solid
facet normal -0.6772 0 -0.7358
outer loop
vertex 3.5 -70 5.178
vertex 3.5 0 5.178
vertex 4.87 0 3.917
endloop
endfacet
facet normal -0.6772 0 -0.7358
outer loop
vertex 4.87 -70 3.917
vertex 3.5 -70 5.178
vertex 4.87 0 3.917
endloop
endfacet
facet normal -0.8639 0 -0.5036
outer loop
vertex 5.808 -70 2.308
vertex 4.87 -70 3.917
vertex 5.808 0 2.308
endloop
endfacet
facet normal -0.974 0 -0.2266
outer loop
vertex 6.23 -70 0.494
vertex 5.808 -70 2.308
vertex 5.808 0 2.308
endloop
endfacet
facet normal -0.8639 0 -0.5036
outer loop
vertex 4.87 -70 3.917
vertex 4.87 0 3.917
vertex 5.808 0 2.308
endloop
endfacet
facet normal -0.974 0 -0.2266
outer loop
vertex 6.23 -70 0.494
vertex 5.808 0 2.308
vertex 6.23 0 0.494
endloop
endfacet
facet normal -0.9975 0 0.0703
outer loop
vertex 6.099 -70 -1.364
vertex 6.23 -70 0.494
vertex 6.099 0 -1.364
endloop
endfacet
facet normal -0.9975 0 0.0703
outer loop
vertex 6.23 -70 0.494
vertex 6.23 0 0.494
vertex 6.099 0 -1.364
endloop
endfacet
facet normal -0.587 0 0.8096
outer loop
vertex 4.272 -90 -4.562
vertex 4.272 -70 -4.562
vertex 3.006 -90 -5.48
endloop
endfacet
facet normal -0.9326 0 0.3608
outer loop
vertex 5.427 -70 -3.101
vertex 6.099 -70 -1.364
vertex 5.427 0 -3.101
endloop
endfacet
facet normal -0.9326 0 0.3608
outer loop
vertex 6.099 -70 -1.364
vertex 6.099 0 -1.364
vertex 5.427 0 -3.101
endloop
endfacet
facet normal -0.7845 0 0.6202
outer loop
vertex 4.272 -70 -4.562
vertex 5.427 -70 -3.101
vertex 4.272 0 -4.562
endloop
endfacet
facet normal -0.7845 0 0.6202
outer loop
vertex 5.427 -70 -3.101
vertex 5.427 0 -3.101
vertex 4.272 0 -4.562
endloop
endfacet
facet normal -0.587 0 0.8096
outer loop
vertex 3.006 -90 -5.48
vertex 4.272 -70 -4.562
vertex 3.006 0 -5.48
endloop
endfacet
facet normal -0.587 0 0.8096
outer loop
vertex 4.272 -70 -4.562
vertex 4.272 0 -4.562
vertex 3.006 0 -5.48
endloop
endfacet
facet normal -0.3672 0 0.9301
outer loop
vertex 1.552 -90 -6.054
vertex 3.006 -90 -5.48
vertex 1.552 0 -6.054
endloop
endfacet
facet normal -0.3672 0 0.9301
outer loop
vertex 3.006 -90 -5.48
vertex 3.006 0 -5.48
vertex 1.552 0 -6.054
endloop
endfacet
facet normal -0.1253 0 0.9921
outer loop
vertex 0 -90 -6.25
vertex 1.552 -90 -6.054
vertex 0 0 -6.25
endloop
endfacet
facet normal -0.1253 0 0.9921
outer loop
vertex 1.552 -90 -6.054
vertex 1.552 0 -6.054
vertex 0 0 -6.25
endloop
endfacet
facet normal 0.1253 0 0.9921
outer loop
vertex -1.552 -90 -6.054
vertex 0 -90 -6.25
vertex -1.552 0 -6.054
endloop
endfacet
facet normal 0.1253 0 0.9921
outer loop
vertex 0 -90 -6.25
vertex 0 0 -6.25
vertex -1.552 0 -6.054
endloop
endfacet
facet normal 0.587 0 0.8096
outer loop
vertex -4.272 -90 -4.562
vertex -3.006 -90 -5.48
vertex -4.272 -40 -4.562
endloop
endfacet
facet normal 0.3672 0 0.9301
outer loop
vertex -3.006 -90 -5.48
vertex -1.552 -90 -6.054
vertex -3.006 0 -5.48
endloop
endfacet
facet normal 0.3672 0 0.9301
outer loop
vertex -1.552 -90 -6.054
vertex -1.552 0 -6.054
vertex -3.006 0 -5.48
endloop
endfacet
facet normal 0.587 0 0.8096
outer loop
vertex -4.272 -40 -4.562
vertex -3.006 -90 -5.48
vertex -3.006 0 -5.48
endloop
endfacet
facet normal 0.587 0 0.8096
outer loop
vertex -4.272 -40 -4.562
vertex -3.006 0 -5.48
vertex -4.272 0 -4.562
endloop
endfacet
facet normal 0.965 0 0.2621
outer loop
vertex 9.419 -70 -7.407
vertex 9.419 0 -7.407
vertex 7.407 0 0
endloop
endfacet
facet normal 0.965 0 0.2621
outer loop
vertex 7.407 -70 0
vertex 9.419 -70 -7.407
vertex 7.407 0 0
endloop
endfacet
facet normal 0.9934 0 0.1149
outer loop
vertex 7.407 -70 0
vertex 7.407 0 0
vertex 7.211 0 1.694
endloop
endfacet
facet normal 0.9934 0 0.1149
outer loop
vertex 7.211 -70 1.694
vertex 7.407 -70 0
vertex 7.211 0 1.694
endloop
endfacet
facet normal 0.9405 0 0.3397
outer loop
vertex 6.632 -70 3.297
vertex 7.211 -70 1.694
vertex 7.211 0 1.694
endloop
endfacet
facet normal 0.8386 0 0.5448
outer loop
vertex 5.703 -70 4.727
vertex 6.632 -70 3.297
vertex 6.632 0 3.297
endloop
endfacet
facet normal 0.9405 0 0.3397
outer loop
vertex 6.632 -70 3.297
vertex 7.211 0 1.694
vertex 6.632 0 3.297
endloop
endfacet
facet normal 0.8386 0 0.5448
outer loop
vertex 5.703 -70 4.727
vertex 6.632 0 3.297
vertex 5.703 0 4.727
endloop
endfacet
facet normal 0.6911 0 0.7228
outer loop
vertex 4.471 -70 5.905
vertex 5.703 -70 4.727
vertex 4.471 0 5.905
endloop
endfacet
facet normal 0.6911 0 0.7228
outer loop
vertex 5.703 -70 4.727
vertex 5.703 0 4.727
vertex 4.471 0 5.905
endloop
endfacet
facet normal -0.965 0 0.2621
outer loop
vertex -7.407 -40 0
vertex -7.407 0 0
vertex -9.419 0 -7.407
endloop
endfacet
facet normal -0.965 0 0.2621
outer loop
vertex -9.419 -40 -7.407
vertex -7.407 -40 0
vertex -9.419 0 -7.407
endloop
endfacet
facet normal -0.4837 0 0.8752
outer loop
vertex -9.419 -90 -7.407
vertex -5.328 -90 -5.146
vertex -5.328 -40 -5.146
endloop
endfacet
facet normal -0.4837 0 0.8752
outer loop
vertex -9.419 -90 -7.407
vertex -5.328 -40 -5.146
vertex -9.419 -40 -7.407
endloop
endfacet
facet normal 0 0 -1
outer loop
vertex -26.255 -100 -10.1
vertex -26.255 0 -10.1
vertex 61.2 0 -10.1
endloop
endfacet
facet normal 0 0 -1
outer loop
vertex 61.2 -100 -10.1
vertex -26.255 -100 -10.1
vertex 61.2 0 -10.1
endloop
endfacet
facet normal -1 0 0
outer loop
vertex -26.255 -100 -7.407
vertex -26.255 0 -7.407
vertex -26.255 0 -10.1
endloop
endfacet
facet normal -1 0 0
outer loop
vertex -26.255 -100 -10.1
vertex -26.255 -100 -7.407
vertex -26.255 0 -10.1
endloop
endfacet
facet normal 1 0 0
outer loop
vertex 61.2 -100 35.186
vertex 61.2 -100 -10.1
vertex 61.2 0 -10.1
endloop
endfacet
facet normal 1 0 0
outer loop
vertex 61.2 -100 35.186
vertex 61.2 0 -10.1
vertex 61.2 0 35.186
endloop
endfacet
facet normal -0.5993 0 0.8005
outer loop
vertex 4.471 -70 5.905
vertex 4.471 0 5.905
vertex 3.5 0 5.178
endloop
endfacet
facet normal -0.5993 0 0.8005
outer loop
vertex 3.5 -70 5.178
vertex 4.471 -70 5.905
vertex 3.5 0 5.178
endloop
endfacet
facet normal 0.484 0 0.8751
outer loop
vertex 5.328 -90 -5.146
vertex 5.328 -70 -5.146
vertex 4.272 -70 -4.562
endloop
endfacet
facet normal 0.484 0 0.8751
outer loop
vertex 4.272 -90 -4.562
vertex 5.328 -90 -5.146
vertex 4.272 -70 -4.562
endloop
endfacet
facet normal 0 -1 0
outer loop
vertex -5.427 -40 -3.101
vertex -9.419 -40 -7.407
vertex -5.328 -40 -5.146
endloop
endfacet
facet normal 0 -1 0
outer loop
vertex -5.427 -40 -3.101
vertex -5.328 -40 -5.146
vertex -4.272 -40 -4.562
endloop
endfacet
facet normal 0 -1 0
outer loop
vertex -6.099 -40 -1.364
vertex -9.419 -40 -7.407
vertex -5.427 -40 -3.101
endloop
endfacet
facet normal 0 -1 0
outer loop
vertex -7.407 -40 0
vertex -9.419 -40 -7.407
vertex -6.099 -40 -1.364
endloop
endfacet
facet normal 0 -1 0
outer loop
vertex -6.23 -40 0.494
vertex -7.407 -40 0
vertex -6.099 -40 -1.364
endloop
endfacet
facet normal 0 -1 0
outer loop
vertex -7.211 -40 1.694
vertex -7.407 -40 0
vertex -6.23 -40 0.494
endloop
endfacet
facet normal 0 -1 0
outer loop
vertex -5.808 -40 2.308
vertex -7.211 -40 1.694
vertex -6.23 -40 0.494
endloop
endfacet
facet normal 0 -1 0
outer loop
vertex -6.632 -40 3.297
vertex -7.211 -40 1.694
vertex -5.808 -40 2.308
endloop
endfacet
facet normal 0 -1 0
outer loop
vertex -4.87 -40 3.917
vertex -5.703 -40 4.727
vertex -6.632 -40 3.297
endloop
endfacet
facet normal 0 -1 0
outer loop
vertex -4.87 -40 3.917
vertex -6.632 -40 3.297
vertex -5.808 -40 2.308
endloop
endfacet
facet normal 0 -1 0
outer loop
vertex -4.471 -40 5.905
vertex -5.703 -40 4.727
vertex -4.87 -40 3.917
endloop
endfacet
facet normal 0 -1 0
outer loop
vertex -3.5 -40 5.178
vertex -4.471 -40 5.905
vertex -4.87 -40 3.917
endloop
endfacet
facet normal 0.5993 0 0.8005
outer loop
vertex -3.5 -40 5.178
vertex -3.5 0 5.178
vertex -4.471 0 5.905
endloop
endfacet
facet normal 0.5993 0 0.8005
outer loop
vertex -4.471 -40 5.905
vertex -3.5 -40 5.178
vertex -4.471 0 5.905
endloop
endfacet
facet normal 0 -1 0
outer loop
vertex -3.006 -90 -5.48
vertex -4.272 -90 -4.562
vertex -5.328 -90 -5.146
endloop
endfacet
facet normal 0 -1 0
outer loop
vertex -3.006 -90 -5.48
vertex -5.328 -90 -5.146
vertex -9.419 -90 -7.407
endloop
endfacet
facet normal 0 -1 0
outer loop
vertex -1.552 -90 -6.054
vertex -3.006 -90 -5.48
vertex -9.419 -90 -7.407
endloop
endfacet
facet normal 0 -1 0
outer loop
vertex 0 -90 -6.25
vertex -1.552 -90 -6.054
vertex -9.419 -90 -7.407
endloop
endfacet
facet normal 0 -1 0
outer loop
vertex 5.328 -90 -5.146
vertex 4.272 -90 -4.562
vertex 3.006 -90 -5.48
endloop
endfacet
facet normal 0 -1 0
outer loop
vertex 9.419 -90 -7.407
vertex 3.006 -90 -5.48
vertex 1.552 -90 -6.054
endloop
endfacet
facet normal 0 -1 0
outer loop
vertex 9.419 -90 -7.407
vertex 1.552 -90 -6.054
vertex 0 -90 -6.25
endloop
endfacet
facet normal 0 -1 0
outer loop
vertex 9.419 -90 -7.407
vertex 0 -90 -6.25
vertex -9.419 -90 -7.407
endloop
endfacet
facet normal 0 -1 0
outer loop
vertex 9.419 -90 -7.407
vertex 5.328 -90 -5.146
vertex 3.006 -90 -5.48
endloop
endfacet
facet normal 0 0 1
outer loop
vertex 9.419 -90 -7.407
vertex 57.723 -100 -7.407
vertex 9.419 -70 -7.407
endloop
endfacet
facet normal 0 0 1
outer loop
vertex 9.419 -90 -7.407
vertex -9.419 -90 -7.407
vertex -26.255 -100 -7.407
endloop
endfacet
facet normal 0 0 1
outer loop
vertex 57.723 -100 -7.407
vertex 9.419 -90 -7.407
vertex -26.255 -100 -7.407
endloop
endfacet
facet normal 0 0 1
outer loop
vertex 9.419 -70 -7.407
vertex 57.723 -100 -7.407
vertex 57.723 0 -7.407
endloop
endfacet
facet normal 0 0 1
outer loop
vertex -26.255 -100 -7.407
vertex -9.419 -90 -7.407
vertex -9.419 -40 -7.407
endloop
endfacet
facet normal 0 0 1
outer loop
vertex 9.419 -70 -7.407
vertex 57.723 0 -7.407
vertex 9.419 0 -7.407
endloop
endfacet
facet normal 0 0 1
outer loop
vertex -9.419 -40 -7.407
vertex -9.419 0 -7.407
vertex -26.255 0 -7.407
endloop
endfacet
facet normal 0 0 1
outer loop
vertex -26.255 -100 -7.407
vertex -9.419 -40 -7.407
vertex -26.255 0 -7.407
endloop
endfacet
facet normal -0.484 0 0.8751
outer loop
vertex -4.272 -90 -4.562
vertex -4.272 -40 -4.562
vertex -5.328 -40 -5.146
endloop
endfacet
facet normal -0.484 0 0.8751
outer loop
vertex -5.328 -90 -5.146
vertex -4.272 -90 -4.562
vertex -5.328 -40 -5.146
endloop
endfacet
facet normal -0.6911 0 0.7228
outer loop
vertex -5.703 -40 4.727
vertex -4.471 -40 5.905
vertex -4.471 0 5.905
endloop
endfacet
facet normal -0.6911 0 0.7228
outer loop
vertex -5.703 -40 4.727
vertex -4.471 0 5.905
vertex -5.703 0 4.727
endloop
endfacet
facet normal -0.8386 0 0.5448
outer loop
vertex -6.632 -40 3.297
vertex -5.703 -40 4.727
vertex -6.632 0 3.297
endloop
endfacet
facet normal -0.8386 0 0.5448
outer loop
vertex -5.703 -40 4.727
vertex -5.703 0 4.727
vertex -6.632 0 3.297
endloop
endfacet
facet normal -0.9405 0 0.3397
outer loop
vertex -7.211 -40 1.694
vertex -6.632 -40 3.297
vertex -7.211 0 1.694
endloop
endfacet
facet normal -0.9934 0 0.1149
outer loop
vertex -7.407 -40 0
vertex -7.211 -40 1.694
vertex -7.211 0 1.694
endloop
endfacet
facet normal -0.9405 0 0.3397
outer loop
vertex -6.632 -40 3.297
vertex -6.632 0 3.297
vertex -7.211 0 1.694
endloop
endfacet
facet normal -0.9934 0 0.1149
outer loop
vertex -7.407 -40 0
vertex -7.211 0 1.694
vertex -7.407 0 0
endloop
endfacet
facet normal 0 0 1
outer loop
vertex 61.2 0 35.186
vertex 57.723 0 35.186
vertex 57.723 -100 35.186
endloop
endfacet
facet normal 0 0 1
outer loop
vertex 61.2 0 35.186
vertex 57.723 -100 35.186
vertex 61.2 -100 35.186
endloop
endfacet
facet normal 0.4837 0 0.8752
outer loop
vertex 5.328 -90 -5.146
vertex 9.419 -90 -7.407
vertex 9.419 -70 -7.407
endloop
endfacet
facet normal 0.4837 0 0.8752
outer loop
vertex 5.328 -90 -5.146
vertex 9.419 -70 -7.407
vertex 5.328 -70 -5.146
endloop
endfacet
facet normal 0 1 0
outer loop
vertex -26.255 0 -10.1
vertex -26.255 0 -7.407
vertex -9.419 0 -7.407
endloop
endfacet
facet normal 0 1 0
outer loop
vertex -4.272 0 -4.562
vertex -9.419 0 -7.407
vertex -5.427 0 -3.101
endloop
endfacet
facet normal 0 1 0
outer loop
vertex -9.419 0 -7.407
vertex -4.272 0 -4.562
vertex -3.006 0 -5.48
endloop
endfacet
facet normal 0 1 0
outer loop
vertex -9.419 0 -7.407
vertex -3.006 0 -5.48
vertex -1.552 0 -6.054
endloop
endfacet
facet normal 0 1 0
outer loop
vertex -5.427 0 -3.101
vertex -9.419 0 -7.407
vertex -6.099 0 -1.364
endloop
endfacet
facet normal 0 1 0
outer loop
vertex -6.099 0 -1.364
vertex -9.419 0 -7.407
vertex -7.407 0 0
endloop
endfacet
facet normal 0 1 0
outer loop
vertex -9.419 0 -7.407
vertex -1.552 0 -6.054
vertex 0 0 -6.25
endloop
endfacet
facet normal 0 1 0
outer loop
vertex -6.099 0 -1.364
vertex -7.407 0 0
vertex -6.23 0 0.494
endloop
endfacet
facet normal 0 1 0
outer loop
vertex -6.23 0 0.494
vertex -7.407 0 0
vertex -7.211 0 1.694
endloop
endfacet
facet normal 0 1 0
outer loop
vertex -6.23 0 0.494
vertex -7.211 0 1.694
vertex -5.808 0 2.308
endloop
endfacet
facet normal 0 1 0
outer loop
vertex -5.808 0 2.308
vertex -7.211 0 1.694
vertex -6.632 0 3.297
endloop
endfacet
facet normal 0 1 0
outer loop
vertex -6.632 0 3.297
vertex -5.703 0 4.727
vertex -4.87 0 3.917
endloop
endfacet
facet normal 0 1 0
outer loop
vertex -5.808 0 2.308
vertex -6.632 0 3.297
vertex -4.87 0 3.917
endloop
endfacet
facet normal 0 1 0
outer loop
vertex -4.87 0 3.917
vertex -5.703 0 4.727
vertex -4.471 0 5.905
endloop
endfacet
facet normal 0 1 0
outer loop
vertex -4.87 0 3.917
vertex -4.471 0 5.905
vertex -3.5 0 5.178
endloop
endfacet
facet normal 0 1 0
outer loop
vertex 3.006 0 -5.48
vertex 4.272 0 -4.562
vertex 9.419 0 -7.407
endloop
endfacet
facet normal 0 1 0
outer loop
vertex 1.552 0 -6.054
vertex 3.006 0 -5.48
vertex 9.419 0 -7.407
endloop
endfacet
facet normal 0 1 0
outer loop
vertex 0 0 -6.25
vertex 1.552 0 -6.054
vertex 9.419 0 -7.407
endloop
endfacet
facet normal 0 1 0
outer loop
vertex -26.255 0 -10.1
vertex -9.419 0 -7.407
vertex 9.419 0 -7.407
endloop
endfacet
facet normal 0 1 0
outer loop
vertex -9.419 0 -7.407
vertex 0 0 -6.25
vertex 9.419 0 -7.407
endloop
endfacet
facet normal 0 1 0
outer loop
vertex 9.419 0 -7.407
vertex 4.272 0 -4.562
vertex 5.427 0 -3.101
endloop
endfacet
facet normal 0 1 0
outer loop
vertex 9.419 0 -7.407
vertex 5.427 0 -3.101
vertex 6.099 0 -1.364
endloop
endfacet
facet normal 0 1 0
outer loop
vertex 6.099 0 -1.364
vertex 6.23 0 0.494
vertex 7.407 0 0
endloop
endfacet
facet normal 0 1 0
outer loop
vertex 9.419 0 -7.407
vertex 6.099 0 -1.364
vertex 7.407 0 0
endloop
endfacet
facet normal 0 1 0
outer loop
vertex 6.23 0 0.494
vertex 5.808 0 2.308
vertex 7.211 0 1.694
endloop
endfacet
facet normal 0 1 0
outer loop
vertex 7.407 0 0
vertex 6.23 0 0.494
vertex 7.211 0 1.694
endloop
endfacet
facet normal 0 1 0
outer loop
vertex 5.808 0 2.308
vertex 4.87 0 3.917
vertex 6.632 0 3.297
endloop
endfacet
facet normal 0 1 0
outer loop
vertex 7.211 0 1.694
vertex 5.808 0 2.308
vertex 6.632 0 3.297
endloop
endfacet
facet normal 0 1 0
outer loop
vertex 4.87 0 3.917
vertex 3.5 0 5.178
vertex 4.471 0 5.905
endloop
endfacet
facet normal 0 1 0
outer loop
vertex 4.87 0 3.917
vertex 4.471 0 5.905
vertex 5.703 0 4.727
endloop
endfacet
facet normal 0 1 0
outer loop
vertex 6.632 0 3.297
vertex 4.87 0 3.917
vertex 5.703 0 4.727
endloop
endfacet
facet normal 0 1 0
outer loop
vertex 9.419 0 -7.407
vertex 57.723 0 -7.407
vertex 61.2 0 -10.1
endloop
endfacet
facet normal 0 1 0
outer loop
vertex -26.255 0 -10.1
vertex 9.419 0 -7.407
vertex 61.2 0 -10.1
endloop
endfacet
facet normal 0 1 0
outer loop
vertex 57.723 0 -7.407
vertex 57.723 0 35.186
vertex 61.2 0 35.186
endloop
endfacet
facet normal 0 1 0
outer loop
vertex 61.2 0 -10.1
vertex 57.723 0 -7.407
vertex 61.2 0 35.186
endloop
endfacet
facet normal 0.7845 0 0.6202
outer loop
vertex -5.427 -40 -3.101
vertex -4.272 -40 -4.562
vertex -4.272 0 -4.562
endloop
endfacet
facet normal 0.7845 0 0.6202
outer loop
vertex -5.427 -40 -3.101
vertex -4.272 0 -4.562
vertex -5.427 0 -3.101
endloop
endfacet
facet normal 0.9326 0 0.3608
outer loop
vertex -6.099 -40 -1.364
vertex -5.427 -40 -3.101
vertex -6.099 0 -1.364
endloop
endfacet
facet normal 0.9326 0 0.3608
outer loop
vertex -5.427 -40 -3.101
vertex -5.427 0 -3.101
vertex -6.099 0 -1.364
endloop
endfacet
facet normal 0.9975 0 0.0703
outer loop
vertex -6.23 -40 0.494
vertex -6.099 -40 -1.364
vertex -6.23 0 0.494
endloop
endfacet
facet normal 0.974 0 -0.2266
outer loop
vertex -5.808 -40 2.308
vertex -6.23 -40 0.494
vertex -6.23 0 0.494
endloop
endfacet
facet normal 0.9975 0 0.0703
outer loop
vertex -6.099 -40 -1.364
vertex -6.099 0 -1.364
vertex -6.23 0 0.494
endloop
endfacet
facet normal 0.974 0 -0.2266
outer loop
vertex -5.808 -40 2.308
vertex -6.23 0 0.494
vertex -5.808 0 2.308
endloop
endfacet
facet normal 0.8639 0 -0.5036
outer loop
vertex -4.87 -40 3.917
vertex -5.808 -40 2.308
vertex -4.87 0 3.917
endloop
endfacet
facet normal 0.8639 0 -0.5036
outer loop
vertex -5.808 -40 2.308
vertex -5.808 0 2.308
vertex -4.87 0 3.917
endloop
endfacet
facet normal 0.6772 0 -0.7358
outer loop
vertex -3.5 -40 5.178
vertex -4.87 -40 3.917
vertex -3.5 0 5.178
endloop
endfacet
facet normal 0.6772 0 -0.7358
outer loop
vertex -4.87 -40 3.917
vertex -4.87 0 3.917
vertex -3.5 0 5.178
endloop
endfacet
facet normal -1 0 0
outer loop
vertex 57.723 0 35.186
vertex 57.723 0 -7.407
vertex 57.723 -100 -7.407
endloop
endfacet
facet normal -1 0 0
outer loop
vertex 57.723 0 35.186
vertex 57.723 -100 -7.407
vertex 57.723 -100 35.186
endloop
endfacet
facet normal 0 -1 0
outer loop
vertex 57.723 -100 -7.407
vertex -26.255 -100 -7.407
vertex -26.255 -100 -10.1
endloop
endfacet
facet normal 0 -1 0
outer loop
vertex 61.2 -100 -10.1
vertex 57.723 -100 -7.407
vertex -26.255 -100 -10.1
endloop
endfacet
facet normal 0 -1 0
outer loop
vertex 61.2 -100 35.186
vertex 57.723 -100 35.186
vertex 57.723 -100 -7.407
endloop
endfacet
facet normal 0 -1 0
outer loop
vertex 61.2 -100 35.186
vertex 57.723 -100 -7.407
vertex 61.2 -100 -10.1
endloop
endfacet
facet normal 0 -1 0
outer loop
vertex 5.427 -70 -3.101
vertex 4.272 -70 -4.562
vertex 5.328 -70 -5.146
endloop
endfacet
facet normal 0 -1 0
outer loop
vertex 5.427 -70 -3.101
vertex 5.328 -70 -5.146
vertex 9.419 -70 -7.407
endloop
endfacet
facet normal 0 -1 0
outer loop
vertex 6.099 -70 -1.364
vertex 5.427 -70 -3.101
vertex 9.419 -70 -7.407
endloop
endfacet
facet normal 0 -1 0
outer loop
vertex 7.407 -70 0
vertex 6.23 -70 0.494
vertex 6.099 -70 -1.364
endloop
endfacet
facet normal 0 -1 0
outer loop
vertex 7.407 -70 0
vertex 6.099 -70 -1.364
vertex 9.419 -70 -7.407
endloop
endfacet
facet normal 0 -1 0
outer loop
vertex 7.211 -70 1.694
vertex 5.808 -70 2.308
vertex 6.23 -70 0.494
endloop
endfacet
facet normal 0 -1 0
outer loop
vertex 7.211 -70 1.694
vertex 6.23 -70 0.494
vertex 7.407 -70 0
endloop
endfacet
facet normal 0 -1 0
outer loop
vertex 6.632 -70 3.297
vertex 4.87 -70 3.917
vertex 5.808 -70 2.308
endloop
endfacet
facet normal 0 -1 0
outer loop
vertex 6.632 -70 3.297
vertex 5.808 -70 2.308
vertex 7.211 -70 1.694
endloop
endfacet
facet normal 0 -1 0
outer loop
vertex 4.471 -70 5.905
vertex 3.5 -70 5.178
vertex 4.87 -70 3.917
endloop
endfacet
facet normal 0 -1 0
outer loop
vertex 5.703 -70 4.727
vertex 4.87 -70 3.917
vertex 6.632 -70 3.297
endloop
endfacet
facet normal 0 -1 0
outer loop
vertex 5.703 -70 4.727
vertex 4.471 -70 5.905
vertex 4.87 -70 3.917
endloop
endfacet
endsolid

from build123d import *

# Parameters (mm, degrees)
F1_DEPTH = 90
F2_DEPTH = 40
F0_W     = 3.4774128616
F0_H     = 42.5927758359
F3_DEPTH = 100
F4_DEPTH = 70


# Not quite as in the source:
# - a feature names something its author has since deleted; it is built from what else it names


with BuildPart() as f1:
    # F0 (on Front) → F1 (new body)
    with BuildSketch(Plane.XZ):
        with BuildLine():
            ThreePointArc((4.2720749172, -4.5620034965), (0, -6.25), (-4.2720749172, -4.5620034965))
            Line((-4.2720749172, -4.5620034965), (-5.3278356976, -5.1455675625))
            ThreePointArc((-5.3278356976, -5.1455675625), (-2.8939428024, -6.818195789), (0, -7.4069358551))
            ThreePointArc((0, -7.4069358551), (2.8939428024, -6.818195789), (5.3278356976, -5.1455675625))
            Line((5.3278356976, -5.1455675625), (4.2720749172, -4.5620034965))
        make_face()
        with BuildLine():
            Line((9.4190128148, -7.4069358551), (5.3278356976, -5.1455675625))
            ThreePointArc((5.3278356976, -5.1455675625), (2.8939428024, -6.818195789), (0, -7.4069358551))
            Line((0, -7.4069358551), (9.4190128148, -7.4069358551))
        make_face()
        with BuildLine():
            ThreePointArc((0, -7.4069358551), (-2.8939428024, -6.818195789), (-5.3278356976, -5.1455675625))
            Line((-5.3278356976, -5.1455675625), (-9.4190128148, -7.4069358551))
            Line((-9.4190128148, -7.4069358551), (0, -7.4069358551))
        make_face()
        Polygon((9.4190128148, -7.4069358551), (0, -7.4069358551), (0, -10.1), (61.2, -10.1), (61.2, -7.4069358551), (57.7225871384, -7.4069358551), align=None)
    extrude(amount=F1_DEPTH)

    # F0 (on Front) → F2 (join)
    with BuildSketch(Plane.XZ):
        with BuildLine():
            Line((-9.4190128148, -7.4069358551), (-5.3278356976, -5.1455675625))
            ThreePointArc((-5.3278356976, -5.1455675625), (-6.8675190578, -2.7748658979), (-7.4069358551, 0))
            Line((-7.4069358551, 0), (-9.4190128148, -7.4069358551))
        make_face()
        with BuildLine():
            ThreePointArc((-4.2720749172, -4.5620034965), (-6.230456475, 0.4938745919), (-3.5, 5.1780787943))
            Line((-3.5, 5.1780787943), (-4.4709416805, 5.9053686803))
            ThreePointArc((-4.4709416805, 5.9053686803), (-6.6324458912, 3.2974778636), (-7.4069358551, 0))
            ThreePointArc((-7.4069358551, 0), (-6.8675190578, -2.7748658979), (-5.3278356976, -5.1455675625))
            Line((-5.3278356976, -5.1455675625), (-4.2720749172, -4.5620034965))
        make_face()
        with BuildLine():
            ThreePointArc((3.5, 5.1780787943), (6.230456475, 0.4938745919), (4.2720749172, -4.5620034965))
            Line((4.2720749172, -4.5620034965), (5.3278356976, -5.1455675625))
            ThreePointArc((5.3278356976, -5.1455675625), (6.8675190578, -2.7748658979), (7.4069358551, 0))
            ThreePointArc((7.4069358551, 0), (6.6324458912, 3.2974778636), (4.4709416805, 5.9053686803))
            Line((4.4709416805, 5.9053686803), (3.5, 5.1780787943))
        make_face()
        with BuildLine():
            ThreePointArc((7.4069358551, 0), (6.8675190578, -2.7748658979), (5.3278356976, -5.1455675625))
            Line((5.3278356976, -5.1455675625), (9.4190128148, -7.4069358551))
            Line((9.4190128148, -7.4069358551), (7.4069358551, 0))
        make_face()
    extrude(amount=F2_DEPTH)

    # F0 (on Front) → F3 (join)
    with BuildSketch(Plane.XZ):
        Polygon((0, -10.1), (0, -7.4069358551), (-9.4190128148, -7.4069358551), (-26.2554790825, -7.4069358551), (-26.2554790825, -10.1), align=None)
        Polygon((9.4190128148, -7.4069358551), (0, -7.4069358551), (0, -10.1), (61.2, -10.1), (61.2, -7.4069358551), (57.7225871384, -7.4069358551), align=None)
        with Locations((59.4612935692, 13.8894520629)):
            Rectangle(F0_W, F0_H)
    extrude(amount=F3_DEPTH)

    # F0 (on Front) → F4 (join)
    with BuildSketch(Plane.XZ):
        with BuildLine():
            ThreePointArc((3.5, 5.1780787943), (6.230456475, 0.4938745919), (4.2720749172, -4.5620034965))
            Line((4.2720749172, -4.5620034965), (5.3278356976, -5.1455675625))
            ThreePointArc((5.3278356976, -5.1455675625), (6.8675190578, -2.7748658979), (7.4069358551, 0))
            ThreePointArc((7.4069358551, 0), (6.6324458912, 3.2974778636), (4.4709416805, 5.9053686803))
            Line((4.4709416805, 5.9053686803), (3.5, 5.1780787943))
        make_face()
        with BuildLine():
            ThreePointArc((7.4069358551, 0), (6.8675190578, -2.7748658979), (5.3278356976, -5.1455675625))
            Line((5.3278356976, -5.1455675625), (9.4190128148, -7.4069358551))
            Line((9.4190128148, -7.4069358551), (7.4069358551, 0))
        make_face()
    extrude(amount=F4_DEPTH)


solid = f1.part
